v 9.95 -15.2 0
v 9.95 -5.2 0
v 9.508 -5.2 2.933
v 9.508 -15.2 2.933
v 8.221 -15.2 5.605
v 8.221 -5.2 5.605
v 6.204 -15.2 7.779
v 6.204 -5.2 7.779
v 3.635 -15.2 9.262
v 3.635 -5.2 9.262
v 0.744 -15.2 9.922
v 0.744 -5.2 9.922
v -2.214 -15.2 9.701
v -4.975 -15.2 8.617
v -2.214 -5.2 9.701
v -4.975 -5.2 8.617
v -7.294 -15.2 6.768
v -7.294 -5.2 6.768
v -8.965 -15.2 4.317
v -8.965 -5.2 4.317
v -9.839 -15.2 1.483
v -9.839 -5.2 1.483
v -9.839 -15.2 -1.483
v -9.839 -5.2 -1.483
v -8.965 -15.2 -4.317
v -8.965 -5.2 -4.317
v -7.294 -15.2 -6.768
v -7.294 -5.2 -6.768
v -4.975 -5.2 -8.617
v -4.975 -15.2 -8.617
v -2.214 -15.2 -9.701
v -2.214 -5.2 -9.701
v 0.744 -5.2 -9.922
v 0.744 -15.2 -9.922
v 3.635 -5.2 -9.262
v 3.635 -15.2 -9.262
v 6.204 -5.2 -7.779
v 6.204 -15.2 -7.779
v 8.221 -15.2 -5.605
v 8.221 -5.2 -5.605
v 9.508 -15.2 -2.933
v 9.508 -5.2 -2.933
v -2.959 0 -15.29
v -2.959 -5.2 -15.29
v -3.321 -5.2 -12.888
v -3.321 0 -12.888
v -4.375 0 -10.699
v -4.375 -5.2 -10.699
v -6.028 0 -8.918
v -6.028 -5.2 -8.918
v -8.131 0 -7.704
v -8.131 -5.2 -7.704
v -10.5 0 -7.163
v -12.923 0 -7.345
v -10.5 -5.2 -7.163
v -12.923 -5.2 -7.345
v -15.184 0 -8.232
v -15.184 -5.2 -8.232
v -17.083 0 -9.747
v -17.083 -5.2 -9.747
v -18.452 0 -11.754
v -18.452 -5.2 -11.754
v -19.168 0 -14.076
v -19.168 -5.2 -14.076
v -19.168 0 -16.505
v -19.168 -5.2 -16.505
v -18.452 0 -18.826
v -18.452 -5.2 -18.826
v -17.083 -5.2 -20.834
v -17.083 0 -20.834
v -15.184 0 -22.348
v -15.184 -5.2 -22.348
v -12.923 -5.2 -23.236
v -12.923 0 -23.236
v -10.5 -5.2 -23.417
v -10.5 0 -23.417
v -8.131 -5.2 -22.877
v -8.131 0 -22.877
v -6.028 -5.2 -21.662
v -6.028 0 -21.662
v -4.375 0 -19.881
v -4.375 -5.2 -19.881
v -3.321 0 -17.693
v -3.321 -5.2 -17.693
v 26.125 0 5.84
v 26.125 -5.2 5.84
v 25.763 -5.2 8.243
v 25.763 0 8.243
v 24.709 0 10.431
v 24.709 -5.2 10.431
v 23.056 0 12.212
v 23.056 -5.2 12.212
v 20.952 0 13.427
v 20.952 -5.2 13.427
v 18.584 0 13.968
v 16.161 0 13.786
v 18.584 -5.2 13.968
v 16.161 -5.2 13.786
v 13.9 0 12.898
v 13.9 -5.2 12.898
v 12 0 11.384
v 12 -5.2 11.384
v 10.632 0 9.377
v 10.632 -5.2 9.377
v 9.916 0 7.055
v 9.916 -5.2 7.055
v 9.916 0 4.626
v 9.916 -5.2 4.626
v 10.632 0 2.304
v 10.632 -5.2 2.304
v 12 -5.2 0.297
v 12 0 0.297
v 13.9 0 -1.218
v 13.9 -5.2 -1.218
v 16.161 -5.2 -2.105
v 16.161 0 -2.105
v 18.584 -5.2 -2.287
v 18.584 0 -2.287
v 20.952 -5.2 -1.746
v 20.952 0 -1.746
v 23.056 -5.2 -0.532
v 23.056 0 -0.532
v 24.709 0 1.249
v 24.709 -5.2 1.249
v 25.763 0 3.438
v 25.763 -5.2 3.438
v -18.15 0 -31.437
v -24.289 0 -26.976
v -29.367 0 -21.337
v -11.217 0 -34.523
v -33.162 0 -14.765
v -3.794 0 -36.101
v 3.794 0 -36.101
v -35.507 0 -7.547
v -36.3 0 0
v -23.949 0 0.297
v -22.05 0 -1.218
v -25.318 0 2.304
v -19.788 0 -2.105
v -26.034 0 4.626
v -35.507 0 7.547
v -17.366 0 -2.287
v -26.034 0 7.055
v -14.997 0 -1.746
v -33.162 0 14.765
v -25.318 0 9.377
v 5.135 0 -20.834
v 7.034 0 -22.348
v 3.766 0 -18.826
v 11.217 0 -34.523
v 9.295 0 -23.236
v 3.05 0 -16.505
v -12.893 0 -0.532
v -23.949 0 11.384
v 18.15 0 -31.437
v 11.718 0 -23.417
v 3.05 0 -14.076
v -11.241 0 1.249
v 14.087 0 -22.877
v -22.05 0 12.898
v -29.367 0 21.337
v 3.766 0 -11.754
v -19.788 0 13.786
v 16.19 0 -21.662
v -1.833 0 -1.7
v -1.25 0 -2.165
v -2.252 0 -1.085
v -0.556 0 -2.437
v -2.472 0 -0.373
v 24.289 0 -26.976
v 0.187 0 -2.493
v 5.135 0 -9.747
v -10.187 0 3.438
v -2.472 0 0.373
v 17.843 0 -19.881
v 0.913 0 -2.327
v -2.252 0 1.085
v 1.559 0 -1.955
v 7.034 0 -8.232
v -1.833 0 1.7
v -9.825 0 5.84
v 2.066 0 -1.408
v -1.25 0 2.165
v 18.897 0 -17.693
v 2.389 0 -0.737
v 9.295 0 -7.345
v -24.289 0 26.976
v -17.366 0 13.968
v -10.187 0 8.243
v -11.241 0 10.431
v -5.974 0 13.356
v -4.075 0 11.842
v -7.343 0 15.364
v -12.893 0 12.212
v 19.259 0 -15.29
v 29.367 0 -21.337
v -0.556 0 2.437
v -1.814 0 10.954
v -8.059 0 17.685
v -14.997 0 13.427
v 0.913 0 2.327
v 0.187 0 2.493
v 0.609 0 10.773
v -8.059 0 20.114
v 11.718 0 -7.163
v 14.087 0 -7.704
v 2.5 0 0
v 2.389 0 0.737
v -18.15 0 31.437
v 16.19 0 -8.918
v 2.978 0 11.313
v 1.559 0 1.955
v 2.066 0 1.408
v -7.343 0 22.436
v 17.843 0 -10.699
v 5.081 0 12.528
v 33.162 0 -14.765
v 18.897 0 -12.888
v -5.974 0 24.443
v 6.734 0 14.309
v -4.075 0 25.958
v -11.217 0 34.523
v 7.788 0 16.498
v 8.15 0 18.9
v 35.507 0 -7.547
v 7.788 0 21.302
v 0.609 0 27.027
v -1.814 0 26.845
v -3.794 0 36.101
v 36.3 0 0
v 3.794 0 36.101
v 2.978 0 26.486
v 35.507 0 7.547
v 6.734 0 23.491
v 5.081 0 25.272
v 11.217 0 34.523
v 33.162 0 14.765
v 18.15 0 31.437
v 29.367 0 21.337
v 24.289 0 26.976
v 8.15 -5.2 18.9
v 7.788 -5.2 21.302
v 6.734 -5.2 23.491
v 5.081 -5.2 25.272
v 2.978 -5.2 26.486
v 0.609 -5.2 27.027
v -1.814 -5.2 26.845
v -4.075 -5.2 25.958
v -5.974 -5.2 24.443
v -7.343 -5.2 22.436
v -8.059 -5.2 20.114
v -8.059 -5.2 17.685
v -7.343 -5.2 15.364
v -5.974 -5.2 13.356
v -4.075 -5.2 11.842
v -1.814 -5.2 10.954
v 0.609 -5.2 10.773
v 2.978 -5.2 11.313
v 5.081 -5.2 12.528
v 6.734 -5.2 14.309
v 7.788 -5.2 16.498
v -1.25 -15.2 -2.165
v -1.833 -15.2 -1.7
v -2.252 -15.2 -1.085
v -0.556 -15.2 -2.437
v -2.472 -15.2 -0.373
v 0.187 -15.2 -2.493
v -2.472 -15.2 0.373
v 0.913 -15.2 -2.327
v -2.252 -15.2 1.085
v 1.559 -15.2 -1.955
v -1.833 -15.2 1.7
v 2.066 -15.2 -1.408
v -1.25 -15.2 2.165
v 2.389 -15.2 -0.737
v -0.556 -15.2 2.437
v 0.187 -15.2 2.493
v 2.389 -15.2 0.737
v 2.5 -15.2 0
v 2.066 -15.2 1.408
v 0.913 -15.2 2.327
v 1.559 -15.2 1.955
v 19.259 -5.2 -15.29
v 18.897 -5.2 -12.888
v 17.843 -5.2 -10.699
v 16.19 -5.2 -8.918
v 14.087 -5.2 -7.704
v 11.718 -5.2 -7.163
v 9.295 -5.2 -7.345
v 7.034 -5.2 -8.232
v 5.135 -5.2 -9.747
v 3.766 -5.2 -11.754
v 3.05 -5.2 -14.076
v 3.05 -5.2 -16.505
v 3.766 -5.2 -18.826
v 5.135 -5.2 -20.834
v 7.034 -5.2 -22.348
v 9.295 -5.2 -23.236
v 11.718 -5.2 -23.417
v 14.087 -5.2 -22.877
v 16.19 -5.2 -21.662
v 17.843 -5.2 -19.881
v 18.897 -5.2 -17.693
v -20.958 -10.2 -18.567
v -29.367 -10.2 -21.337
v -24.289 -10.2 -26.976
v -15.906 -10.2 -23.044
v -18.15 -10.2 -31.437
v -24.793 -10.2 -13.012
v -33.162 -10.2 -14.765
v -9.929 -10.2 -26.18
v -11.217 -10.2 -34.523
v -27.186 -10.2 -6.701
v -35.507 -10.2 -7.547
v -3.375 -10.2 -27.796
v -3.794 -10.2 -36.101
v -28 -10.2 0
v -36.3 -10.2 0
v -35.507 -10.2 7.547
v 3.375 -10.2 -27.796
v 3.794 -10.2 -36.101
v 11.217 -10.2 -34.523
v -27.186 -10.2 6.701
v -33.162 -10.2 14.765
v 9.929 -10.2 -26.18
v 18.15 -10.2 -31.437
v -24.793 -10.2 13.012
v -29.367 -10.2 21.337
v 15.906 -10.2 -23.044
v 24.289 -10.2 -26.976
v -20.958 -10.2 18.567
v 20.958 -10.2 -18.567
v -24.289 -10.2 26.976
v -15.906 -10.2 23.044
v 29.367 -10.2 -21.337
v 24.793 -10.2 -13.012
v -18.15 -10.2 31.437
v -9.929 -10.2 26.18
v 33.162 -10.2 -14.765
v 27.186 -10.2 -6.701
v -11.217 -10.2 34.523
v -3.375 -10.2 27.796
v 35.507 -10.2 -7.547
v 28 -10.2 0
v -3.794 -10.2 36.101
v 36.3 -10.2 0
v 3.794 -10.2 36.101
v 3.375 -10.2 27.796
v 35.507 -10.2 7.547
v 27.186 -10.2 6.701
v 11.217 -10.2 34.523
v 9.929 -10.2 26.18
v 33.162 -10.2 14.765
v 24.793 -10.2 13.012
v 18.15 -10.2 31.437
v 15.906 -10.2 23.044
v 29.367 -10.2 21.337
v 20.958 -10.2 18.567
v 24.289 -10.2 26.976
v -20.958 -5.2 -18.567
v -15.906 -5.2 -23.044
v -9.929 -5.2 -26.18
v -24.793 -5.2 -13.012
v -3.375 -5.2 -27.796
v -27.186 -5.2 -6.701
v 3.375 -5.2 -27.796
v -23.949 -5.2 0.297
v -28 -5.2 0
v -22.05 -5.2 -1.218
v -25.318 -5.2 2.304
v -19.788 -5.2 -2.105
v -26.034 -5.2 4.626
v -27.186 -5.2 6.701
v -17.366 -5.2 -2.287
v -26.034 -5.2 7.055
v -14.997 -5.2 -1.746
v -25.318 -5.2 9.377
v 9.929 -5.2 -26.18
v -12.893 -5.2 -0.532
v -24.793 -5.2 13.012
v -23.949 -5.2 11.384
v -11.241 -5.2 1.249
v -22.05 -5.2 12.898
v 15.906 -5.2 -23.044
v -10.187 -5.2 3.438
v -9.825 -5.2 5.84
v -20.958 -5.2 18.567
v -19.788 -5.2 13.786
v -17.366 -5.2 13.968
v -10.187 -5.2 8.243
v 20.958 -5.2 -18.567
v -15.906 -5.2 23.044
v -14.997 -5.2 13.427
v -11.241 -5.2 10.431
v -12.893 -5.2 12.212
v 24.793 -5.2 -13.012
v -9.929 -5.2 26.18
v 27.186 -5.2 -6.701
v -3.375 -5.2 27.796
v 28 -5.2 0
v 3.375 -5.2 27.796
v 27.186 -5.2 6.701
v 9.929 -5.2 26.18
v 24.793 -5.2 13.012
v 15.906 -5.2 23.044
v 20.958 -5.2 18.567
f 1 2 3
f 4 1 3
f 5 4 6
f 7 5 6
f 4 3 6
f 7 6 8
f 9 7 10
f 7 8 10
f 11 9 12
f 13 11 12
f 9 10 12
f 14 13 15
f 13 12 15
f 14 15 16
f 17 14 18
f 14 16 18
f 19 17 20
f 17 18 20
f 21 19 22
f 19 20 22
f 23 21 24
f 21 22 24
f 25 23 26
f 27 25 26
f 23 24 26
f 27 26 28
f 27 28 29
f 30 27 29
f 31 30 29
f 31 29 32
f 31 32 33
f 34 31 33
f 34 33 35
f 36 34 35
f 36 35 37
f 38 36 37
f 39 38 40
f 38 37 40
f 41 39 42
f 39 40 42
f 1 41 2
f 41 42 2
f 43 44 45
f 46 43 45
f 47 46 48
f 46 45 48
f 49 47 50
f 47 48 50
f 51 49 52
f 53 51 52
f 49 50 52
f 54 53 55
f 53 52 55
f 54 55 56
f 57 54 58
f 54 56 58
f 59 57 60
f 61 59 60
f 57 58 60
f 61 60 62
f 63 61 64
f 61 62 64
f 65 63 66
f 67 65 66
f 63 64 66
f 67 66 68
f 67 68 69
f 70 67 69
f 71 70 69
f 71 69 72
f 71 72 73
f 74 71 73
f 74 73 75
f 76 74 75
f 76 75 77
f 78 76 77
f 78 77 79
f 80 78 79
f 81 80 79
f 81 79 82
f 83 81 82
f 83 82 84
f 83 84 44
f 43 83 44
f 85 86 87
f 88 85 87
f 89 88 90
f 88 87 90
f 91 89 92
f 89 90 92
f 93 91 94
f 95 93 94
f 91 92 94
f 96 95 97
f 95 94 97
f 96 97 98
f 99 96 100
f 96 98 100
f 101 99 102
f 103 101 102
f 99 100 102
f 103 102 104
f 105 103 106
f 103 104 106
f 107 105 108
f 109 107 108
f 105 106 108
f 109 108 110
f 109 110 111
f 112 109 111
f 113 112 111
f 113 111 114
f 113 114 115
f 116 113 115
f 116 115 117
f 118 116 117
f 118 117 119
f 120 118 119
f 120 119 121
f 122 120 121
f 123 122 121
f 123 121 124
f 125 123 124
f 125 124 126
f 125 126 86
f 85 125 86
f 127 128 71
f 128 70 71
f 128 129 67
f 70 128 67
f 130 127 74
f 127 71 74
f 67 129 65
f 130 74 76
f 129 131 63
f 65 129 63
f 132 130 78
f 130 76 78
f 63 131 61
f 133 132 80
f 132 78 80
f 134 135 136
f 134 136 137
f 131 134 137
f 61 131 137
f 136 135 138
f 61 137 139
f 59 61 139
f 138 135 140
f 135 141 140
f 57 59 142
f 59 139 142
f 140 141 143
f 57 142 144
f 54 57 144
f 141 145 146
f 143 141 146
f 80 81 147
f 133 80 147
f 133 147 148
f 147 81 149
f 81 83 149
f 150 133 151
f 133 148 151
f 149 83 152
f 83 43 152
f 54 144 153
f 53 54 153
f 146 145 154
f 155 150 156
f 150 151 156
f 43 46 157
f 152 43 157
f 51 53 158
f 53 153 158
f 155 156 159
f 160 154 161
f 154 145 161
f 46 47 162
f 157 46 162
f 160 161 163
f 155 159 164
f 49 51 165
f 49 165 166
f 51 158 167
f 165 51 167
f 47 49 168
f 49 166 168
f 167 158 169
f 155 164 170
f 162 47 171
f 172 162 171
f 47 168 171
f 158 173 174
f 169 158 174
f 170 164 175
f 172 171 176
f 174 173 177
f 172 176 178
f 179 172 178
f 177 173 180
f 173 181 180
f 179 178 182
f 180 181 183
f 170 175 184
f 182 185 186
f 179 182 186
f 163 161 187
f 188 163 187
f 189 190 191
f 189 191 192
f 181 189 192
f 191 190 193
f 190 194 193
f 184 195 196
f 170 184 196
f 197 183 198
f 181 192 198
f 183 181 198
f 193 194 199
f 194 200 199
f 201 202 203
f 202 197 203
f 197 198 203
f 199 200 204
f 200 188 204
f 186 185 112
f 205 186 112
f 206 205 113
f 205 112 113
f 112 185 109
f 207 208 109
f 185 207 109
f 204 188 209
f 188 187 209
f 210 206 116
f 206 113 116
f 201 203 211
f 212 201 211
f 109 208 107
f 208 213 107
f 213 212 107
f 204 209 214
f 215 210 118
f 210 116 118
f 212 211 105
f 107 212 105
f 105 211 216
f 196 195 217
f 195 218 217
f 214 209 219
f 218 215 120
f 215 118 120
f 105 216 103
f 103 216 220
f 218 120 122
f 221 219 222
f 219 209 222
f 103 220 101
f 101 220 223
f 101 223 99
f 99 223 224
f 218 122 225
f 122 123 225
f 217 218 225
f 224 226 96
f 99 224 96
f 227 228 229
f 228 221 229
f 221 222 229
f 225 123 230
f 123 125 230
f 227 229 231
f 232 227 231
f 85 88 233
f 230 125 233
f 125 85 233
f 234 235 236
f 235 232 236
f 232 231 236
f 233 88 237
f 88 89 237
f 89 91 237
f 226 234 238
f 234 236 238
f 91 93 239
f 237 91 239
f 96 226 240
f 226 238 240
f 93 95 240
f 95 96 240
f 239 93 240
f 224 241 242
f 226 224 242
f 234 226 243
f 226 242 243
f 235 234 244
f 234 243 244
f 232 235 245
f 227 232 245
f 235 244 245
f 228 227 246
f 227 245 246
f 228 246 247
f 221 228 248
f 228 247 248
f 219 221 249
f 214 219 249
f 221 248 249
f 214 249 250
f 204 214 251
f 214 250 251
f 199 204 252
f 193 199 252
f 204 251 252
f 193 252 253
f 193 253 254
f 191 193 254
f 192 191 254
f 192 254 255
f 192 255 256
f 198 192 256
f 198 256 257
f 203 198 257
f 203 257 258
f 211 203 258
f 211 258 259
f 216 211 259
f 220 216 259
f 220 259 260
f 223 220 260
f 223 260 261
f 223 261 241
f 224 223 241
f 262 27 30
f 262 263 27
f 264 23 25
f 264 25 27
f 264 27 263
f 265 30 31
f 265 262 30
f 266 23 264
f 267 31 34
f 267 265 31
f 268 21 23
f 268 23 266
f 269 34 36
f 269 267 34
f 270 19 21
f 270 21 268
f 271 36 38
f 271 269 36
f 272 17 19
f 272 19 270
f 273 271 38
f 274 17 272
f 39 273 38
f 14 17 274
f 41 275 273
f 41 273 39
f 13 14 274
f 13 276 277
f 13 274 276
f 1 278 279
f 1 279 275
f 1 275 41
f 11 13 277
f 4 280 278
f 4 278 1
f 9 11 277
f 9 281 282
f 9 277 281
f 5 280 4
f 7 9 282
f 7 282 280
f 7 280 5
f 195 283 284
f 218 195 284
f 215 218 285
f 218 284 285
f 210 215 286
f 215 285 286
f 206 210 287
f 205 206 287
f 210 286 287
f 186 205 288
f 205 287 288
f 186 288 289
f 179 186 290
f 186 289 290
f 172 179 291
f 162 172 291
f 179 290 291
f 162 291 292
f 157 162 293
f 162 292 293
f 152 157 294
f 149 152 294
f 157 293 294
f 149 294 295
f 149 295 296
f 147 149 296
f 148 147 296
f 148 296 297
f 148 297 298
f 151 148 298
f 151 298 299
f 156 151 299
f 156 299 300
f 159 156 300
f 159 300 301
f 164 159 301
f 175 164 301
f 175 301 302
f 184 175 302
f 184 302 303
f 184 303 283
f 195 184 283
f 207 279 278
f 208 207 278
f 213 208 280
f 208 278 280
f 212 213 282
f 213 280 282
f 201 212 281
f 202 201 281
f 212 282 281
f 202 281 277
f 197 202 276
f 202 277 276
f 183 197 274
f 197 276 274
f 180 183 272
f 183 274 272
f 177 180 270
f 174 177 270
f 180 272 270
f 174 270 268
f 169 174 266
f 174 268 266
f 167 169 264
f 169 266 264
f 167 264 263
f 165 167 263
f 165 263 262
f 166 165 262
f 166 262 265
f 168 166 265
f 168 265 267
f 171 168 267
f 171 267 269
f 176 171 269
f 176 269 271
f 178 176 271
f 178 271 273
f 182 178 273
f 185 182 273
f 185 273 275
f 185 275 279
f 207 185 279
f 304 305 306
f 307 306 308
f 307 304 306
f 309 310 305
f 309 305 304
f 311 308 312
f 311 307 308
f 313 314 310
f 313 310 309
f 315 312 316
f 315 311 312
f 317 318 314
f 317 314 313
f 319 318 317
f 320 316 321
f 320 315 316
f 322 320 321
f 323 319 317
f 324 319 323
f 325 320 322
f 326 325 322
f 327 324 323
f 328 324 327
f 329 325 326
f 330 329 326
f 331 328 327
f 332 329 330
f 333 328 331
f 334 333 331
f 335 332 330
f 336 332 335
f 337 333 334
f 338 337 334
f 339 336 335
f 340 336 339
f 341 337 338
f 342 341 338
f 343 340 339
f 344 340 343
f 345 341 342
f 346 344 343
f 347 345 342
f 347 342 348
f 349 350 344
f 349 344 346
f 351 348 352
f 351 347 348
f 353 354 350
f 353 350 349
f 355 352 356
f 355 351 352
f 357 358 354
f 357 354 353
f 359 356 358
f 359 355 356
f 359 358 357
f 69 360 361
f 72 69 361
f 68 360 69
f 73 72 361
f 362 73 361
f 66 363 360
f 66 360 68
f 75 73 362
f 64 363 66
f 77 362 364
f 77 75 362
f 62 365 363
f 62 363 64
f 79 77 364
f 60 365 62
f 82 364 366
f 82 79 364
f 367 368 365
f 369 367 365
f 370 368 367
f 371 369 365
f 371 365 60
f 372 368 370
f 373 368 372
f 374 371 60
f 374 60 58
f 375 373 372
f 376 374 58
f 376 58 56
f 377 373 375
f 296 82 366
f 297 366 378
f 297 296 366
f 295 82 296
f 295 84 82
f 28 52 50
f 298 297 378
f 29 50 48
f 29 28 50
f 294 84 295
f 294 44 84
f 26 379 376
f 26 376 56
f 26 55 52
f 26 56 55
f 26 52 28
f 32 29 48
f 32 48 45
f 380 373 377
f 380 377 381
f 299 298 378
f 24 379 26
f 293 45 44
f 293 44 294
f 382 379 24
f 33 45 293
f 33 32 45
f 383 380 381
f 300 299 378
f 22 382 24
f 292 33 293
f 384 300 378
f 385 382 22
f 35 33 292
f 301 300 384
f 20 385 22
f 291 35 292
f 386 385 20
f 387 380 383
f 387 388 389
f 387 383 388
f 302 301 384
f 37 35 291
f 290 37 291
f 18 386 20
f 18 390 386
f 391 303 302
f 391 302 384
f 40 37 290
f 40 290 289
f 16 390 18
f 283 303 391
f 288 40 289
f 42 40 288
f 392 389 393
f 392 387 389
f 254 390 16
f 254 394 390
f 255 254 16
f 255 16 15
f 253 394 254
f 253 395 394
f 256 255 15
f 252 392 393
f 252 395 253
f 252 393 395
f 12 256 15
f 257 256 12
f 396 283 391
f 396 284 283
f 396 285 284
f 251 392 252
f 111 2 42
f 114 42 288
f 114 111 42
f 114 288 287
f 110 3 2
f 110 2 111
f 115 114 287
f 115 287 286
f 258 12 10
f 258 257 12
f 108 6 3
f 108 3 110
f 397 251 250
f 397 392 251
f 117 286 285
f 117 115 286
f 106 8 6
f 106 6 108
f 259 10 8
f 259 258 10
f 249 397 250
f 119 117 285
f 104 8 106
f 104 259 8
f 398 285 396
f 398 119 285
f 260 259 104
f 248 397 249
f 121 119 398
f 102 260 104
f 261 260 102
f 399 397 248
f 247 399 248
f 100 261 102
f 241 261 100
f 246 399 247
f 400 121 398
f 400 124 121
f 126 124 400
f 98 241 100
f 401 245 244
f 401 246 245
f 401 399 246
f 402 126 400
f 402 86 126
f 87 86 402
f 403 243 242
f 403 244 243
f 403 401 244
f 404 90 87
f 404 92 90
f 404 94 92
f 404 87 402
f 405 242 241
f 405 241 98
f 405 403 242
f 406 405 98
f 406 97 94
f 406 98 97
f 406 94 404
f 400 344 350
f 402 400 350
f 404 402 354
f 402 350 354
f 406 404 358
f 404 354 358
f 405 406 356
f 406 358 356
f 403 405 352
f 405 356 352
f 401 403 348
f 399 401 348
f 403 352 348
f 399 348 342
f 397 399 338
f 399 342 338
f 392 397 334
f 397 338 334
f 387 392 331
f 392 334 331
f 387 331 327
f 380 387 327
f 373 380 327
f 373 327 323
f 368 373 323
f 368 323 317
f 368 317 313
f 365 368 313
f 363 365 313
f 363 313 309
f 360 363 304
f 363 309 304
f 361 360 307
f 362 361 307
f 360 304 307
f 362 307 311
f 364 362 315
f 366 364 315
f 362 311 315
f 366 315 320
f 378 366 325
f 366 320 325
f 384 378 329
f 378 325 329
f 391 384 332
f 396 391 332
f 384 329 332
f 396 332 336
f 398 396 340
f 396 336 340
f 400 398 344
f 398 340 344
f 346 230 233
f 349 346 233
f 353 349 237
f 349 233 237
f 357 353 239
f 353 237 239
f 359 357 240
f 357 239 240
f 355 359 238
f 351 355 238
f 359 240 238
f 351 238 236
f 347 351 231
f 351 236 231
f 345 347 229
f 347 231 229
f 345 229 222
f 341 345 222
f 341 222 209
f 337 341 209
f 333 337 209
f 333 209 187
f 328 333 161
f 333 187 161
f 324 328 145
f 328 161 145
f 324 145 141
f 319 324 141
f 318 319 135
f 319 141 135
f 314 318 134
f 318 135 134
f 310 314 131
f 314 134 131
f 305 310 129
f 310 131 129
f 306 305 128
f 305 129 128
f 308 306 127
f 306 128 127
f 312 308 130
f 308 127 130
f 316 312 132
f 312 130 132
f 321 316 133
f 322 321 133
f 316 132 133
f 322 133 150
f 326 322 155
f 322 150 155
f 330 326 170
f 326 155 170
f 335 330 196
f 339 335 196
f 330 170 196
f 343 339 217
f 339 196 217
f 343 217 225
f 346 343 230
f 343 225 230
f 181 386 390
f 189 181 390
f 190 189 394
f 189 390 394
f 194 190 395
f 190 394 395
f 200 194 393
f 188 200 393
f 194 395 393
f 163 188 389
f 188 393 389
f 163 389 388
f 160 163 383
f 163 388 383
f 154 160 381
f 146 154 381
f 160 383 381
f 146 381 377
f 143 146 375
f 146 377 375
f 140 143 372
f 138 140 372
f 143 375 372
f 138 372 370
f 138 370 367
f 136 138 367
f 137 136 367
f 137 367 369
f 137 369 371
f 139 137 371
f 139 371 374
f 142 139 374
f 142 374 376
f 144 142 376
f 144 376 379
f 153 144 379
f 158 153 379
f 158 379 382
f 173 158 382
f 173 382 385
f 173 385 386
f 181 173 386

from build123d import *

# Parameters (mm, degrees)
F0_R     = 36.3
F1_DEPTH = 10.2
F2_R     = 28
F3_DEPTH = 5
F4_R     = 9.95
F5_DEPTH = 10
F6_R     = 2.5
F7_DEPTH = 15.201
F8_R     = 8.15
F9_DEPTH = 5.201


with BuildPart() as f1:
    # F0 (on Front) → F1 (new body)
    with BuildSketch(Plane.XZ):
        Circle(F0_R)
    extrude(amount=F1_DEPTH)

    # F2 (on face) → F3 (cut)
    with BuildSketch(Plane.XZ.offset(10.2)):
        Circle(F2_R)
    extrude(amount=-F3_DEPTH, mode=Mode.SUBTRACT)

    # F4 (on face) → F5 (join)
    with BuildSketch(Plane.XZ.offset(5.2)):
        Circle(F4_R)
    extrude(amount=F5_DEPTH)

    # F6 (on face) → F7 (cut, through all)
    with BuildSketch(Plane.XZ.offset(15.2)):
        Circle(F6_R)
    extrude(amount=-F7_DEPTH, mode=Mode.SUBTRACT)

    # F8 (on face) → F9 (cut, through all)
    with BuildSketch(Plane.XZ.offset(5.2)):
        with Locations((0, 18.899804)):
            Circle(F8_R)
        with Locations((-17.974782, 5.840361)):
            Circle(F8_R)
        with Locations((-11.109026, -15.290263)):
            Circle(F8_R)
        with Locations((11.109026, -15.290263)):
            Circle(F8_R)
        with Locations((17.974782, 5.840361)):
            Circle(F8_R)
    extrude(amount=-F9_DEPTH, mode=Mode.SUBTRACT)


solid = f1.part
